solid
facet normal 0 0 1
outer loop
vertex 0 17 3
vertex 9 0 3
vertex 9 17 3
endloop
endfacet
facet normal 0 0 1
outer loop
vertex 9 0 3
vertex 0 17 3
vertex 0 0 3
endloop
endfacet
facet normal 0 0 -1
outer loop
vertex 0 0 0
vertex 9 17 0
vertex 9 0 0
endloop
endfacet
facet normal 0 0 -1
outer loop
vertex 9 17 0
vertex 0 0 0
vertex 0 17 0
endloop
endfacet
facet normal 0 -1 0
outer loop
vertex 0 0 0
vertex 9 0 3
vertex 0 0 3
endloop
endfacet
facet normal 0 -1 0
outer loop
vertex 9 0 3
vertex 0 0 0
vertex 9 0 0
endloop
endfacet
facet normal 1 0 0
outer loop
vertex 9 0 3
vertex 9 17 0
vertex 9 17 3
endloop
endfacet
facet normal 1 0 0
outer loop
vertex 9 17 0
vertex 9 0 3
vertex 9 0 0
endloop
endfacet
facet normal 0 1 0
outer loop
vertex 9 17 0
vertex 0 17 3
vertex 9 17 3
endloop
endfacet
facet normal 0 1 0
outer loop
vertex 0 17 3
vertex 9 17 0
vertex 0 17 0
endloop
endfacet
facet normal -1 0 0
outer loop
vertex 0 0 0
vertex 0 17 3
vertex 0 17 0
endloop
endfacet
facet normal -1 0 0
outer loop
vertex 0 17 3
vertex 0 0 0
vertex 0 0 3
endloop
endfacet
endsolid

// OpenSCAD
// Generated by SolidPython 1.0.1 on 2020-07-29 00:46:55


cube(size = [9, 17, 3]);
/***********************************************
*********      SolidPython code:      **********
************************************************
 
# import packages: SolidPython
from solid import *
from solid.utils import *
from itertools import chain, combinations, permutations


class Resize:

    def __init__(self, scad_file):
        self.scad_file = scad_file
        #self.scad_file = import_scad(scad_file)
        # cone/cylinder param:
        self.r1 = 0
        self.r2 = 0
        self.h = 0
        # rectangular prism param:
        self.w = 0
        self.l = 0
        # ellipse param:
        self.r = 0

    # import OpenScad code (file name corresponds to shape)


    # classify shape + parameters
    def assign(self, param1, param2, param3):
        if self.scad_file == 'cone.scad':
            self.r1 = param1
            self.r2 = param2
            self.h = param3
        elif self.scad_file == 'cylinder.scad':
            self.r1 = param1
            self.r2 = param2
            self.h = param3
        elif self.scad_file == 'rectangularPrism.scad':
            self.h = param1
            self.l = param2
            self.w = param3
        else:
            self.r = param1
            self.h = param2

    # resize parameters
    def iterate(self):
        x = range(3, 20, 2)
        i = 1
        if self.scad_file == 'cone.scad':
            tempList = list(permutations(x, 2))
            for temp in tempList:
                param1 = temp[0]
                param2 = temp[1]
                filepath = 'produced_scad_files/' + 'cone' + str(param1) + '_' + str(param2) + '_' + '.scad'
                scad_render_to_file(cylinder(h=param1, r1=param2, r2=0), filepath)

        elif self.scad_file == 'cylinder.scad':
            tempList = list(permutations(x, 3))
            for temp in tempList:
                param1 = temp[0]
                param2 = temp[1]
                filepath = 'produced_scad_files/' + 'cylinder' + str(param1) + '_' + str(param2) + '_' + '.scad'
                scad_render_to_file(cylinder(h=param1, r1=param2, r2=param2), filepath)

        elif self.scad_file == 'rectangularPrism.scad':
            tempList = list(permutations(x, 3))
            for temp in tempList:
                param1 = temp[0]
                param2 = temp[1]
                param3 = temp[2]
                filepath = 'produced_scad_files/' + 'rectangularPrism' + str(param1) + '_' + str(param2) + '_' + str(
                    param3) + '.scad'
                scad_render_to_file(cube(size=(param1, param2, param3)), filepath)

        elif self.scad_file == 'ellipse.scad':
            tempList = list(permutations(x, 4))
            for temp in tempList:
                param1 = temp[0]
                param2 = temp[1]
                param3 = temp[2]
                param4 = temp[3]
                filepath = 'produced_scad_files/' + 'ellipse' + str(param1) + '_' + str(param2) + '_' + str(param3) + '_' + str(param4) + '.scad'
                scad_render_to_file(scale([param1, param2, param3])(sphere(r=param4)), filepath)

    def render_to_scadfile(self):
        scad_render_to_file(scad, 'example.scad') 
 
************************************************/
